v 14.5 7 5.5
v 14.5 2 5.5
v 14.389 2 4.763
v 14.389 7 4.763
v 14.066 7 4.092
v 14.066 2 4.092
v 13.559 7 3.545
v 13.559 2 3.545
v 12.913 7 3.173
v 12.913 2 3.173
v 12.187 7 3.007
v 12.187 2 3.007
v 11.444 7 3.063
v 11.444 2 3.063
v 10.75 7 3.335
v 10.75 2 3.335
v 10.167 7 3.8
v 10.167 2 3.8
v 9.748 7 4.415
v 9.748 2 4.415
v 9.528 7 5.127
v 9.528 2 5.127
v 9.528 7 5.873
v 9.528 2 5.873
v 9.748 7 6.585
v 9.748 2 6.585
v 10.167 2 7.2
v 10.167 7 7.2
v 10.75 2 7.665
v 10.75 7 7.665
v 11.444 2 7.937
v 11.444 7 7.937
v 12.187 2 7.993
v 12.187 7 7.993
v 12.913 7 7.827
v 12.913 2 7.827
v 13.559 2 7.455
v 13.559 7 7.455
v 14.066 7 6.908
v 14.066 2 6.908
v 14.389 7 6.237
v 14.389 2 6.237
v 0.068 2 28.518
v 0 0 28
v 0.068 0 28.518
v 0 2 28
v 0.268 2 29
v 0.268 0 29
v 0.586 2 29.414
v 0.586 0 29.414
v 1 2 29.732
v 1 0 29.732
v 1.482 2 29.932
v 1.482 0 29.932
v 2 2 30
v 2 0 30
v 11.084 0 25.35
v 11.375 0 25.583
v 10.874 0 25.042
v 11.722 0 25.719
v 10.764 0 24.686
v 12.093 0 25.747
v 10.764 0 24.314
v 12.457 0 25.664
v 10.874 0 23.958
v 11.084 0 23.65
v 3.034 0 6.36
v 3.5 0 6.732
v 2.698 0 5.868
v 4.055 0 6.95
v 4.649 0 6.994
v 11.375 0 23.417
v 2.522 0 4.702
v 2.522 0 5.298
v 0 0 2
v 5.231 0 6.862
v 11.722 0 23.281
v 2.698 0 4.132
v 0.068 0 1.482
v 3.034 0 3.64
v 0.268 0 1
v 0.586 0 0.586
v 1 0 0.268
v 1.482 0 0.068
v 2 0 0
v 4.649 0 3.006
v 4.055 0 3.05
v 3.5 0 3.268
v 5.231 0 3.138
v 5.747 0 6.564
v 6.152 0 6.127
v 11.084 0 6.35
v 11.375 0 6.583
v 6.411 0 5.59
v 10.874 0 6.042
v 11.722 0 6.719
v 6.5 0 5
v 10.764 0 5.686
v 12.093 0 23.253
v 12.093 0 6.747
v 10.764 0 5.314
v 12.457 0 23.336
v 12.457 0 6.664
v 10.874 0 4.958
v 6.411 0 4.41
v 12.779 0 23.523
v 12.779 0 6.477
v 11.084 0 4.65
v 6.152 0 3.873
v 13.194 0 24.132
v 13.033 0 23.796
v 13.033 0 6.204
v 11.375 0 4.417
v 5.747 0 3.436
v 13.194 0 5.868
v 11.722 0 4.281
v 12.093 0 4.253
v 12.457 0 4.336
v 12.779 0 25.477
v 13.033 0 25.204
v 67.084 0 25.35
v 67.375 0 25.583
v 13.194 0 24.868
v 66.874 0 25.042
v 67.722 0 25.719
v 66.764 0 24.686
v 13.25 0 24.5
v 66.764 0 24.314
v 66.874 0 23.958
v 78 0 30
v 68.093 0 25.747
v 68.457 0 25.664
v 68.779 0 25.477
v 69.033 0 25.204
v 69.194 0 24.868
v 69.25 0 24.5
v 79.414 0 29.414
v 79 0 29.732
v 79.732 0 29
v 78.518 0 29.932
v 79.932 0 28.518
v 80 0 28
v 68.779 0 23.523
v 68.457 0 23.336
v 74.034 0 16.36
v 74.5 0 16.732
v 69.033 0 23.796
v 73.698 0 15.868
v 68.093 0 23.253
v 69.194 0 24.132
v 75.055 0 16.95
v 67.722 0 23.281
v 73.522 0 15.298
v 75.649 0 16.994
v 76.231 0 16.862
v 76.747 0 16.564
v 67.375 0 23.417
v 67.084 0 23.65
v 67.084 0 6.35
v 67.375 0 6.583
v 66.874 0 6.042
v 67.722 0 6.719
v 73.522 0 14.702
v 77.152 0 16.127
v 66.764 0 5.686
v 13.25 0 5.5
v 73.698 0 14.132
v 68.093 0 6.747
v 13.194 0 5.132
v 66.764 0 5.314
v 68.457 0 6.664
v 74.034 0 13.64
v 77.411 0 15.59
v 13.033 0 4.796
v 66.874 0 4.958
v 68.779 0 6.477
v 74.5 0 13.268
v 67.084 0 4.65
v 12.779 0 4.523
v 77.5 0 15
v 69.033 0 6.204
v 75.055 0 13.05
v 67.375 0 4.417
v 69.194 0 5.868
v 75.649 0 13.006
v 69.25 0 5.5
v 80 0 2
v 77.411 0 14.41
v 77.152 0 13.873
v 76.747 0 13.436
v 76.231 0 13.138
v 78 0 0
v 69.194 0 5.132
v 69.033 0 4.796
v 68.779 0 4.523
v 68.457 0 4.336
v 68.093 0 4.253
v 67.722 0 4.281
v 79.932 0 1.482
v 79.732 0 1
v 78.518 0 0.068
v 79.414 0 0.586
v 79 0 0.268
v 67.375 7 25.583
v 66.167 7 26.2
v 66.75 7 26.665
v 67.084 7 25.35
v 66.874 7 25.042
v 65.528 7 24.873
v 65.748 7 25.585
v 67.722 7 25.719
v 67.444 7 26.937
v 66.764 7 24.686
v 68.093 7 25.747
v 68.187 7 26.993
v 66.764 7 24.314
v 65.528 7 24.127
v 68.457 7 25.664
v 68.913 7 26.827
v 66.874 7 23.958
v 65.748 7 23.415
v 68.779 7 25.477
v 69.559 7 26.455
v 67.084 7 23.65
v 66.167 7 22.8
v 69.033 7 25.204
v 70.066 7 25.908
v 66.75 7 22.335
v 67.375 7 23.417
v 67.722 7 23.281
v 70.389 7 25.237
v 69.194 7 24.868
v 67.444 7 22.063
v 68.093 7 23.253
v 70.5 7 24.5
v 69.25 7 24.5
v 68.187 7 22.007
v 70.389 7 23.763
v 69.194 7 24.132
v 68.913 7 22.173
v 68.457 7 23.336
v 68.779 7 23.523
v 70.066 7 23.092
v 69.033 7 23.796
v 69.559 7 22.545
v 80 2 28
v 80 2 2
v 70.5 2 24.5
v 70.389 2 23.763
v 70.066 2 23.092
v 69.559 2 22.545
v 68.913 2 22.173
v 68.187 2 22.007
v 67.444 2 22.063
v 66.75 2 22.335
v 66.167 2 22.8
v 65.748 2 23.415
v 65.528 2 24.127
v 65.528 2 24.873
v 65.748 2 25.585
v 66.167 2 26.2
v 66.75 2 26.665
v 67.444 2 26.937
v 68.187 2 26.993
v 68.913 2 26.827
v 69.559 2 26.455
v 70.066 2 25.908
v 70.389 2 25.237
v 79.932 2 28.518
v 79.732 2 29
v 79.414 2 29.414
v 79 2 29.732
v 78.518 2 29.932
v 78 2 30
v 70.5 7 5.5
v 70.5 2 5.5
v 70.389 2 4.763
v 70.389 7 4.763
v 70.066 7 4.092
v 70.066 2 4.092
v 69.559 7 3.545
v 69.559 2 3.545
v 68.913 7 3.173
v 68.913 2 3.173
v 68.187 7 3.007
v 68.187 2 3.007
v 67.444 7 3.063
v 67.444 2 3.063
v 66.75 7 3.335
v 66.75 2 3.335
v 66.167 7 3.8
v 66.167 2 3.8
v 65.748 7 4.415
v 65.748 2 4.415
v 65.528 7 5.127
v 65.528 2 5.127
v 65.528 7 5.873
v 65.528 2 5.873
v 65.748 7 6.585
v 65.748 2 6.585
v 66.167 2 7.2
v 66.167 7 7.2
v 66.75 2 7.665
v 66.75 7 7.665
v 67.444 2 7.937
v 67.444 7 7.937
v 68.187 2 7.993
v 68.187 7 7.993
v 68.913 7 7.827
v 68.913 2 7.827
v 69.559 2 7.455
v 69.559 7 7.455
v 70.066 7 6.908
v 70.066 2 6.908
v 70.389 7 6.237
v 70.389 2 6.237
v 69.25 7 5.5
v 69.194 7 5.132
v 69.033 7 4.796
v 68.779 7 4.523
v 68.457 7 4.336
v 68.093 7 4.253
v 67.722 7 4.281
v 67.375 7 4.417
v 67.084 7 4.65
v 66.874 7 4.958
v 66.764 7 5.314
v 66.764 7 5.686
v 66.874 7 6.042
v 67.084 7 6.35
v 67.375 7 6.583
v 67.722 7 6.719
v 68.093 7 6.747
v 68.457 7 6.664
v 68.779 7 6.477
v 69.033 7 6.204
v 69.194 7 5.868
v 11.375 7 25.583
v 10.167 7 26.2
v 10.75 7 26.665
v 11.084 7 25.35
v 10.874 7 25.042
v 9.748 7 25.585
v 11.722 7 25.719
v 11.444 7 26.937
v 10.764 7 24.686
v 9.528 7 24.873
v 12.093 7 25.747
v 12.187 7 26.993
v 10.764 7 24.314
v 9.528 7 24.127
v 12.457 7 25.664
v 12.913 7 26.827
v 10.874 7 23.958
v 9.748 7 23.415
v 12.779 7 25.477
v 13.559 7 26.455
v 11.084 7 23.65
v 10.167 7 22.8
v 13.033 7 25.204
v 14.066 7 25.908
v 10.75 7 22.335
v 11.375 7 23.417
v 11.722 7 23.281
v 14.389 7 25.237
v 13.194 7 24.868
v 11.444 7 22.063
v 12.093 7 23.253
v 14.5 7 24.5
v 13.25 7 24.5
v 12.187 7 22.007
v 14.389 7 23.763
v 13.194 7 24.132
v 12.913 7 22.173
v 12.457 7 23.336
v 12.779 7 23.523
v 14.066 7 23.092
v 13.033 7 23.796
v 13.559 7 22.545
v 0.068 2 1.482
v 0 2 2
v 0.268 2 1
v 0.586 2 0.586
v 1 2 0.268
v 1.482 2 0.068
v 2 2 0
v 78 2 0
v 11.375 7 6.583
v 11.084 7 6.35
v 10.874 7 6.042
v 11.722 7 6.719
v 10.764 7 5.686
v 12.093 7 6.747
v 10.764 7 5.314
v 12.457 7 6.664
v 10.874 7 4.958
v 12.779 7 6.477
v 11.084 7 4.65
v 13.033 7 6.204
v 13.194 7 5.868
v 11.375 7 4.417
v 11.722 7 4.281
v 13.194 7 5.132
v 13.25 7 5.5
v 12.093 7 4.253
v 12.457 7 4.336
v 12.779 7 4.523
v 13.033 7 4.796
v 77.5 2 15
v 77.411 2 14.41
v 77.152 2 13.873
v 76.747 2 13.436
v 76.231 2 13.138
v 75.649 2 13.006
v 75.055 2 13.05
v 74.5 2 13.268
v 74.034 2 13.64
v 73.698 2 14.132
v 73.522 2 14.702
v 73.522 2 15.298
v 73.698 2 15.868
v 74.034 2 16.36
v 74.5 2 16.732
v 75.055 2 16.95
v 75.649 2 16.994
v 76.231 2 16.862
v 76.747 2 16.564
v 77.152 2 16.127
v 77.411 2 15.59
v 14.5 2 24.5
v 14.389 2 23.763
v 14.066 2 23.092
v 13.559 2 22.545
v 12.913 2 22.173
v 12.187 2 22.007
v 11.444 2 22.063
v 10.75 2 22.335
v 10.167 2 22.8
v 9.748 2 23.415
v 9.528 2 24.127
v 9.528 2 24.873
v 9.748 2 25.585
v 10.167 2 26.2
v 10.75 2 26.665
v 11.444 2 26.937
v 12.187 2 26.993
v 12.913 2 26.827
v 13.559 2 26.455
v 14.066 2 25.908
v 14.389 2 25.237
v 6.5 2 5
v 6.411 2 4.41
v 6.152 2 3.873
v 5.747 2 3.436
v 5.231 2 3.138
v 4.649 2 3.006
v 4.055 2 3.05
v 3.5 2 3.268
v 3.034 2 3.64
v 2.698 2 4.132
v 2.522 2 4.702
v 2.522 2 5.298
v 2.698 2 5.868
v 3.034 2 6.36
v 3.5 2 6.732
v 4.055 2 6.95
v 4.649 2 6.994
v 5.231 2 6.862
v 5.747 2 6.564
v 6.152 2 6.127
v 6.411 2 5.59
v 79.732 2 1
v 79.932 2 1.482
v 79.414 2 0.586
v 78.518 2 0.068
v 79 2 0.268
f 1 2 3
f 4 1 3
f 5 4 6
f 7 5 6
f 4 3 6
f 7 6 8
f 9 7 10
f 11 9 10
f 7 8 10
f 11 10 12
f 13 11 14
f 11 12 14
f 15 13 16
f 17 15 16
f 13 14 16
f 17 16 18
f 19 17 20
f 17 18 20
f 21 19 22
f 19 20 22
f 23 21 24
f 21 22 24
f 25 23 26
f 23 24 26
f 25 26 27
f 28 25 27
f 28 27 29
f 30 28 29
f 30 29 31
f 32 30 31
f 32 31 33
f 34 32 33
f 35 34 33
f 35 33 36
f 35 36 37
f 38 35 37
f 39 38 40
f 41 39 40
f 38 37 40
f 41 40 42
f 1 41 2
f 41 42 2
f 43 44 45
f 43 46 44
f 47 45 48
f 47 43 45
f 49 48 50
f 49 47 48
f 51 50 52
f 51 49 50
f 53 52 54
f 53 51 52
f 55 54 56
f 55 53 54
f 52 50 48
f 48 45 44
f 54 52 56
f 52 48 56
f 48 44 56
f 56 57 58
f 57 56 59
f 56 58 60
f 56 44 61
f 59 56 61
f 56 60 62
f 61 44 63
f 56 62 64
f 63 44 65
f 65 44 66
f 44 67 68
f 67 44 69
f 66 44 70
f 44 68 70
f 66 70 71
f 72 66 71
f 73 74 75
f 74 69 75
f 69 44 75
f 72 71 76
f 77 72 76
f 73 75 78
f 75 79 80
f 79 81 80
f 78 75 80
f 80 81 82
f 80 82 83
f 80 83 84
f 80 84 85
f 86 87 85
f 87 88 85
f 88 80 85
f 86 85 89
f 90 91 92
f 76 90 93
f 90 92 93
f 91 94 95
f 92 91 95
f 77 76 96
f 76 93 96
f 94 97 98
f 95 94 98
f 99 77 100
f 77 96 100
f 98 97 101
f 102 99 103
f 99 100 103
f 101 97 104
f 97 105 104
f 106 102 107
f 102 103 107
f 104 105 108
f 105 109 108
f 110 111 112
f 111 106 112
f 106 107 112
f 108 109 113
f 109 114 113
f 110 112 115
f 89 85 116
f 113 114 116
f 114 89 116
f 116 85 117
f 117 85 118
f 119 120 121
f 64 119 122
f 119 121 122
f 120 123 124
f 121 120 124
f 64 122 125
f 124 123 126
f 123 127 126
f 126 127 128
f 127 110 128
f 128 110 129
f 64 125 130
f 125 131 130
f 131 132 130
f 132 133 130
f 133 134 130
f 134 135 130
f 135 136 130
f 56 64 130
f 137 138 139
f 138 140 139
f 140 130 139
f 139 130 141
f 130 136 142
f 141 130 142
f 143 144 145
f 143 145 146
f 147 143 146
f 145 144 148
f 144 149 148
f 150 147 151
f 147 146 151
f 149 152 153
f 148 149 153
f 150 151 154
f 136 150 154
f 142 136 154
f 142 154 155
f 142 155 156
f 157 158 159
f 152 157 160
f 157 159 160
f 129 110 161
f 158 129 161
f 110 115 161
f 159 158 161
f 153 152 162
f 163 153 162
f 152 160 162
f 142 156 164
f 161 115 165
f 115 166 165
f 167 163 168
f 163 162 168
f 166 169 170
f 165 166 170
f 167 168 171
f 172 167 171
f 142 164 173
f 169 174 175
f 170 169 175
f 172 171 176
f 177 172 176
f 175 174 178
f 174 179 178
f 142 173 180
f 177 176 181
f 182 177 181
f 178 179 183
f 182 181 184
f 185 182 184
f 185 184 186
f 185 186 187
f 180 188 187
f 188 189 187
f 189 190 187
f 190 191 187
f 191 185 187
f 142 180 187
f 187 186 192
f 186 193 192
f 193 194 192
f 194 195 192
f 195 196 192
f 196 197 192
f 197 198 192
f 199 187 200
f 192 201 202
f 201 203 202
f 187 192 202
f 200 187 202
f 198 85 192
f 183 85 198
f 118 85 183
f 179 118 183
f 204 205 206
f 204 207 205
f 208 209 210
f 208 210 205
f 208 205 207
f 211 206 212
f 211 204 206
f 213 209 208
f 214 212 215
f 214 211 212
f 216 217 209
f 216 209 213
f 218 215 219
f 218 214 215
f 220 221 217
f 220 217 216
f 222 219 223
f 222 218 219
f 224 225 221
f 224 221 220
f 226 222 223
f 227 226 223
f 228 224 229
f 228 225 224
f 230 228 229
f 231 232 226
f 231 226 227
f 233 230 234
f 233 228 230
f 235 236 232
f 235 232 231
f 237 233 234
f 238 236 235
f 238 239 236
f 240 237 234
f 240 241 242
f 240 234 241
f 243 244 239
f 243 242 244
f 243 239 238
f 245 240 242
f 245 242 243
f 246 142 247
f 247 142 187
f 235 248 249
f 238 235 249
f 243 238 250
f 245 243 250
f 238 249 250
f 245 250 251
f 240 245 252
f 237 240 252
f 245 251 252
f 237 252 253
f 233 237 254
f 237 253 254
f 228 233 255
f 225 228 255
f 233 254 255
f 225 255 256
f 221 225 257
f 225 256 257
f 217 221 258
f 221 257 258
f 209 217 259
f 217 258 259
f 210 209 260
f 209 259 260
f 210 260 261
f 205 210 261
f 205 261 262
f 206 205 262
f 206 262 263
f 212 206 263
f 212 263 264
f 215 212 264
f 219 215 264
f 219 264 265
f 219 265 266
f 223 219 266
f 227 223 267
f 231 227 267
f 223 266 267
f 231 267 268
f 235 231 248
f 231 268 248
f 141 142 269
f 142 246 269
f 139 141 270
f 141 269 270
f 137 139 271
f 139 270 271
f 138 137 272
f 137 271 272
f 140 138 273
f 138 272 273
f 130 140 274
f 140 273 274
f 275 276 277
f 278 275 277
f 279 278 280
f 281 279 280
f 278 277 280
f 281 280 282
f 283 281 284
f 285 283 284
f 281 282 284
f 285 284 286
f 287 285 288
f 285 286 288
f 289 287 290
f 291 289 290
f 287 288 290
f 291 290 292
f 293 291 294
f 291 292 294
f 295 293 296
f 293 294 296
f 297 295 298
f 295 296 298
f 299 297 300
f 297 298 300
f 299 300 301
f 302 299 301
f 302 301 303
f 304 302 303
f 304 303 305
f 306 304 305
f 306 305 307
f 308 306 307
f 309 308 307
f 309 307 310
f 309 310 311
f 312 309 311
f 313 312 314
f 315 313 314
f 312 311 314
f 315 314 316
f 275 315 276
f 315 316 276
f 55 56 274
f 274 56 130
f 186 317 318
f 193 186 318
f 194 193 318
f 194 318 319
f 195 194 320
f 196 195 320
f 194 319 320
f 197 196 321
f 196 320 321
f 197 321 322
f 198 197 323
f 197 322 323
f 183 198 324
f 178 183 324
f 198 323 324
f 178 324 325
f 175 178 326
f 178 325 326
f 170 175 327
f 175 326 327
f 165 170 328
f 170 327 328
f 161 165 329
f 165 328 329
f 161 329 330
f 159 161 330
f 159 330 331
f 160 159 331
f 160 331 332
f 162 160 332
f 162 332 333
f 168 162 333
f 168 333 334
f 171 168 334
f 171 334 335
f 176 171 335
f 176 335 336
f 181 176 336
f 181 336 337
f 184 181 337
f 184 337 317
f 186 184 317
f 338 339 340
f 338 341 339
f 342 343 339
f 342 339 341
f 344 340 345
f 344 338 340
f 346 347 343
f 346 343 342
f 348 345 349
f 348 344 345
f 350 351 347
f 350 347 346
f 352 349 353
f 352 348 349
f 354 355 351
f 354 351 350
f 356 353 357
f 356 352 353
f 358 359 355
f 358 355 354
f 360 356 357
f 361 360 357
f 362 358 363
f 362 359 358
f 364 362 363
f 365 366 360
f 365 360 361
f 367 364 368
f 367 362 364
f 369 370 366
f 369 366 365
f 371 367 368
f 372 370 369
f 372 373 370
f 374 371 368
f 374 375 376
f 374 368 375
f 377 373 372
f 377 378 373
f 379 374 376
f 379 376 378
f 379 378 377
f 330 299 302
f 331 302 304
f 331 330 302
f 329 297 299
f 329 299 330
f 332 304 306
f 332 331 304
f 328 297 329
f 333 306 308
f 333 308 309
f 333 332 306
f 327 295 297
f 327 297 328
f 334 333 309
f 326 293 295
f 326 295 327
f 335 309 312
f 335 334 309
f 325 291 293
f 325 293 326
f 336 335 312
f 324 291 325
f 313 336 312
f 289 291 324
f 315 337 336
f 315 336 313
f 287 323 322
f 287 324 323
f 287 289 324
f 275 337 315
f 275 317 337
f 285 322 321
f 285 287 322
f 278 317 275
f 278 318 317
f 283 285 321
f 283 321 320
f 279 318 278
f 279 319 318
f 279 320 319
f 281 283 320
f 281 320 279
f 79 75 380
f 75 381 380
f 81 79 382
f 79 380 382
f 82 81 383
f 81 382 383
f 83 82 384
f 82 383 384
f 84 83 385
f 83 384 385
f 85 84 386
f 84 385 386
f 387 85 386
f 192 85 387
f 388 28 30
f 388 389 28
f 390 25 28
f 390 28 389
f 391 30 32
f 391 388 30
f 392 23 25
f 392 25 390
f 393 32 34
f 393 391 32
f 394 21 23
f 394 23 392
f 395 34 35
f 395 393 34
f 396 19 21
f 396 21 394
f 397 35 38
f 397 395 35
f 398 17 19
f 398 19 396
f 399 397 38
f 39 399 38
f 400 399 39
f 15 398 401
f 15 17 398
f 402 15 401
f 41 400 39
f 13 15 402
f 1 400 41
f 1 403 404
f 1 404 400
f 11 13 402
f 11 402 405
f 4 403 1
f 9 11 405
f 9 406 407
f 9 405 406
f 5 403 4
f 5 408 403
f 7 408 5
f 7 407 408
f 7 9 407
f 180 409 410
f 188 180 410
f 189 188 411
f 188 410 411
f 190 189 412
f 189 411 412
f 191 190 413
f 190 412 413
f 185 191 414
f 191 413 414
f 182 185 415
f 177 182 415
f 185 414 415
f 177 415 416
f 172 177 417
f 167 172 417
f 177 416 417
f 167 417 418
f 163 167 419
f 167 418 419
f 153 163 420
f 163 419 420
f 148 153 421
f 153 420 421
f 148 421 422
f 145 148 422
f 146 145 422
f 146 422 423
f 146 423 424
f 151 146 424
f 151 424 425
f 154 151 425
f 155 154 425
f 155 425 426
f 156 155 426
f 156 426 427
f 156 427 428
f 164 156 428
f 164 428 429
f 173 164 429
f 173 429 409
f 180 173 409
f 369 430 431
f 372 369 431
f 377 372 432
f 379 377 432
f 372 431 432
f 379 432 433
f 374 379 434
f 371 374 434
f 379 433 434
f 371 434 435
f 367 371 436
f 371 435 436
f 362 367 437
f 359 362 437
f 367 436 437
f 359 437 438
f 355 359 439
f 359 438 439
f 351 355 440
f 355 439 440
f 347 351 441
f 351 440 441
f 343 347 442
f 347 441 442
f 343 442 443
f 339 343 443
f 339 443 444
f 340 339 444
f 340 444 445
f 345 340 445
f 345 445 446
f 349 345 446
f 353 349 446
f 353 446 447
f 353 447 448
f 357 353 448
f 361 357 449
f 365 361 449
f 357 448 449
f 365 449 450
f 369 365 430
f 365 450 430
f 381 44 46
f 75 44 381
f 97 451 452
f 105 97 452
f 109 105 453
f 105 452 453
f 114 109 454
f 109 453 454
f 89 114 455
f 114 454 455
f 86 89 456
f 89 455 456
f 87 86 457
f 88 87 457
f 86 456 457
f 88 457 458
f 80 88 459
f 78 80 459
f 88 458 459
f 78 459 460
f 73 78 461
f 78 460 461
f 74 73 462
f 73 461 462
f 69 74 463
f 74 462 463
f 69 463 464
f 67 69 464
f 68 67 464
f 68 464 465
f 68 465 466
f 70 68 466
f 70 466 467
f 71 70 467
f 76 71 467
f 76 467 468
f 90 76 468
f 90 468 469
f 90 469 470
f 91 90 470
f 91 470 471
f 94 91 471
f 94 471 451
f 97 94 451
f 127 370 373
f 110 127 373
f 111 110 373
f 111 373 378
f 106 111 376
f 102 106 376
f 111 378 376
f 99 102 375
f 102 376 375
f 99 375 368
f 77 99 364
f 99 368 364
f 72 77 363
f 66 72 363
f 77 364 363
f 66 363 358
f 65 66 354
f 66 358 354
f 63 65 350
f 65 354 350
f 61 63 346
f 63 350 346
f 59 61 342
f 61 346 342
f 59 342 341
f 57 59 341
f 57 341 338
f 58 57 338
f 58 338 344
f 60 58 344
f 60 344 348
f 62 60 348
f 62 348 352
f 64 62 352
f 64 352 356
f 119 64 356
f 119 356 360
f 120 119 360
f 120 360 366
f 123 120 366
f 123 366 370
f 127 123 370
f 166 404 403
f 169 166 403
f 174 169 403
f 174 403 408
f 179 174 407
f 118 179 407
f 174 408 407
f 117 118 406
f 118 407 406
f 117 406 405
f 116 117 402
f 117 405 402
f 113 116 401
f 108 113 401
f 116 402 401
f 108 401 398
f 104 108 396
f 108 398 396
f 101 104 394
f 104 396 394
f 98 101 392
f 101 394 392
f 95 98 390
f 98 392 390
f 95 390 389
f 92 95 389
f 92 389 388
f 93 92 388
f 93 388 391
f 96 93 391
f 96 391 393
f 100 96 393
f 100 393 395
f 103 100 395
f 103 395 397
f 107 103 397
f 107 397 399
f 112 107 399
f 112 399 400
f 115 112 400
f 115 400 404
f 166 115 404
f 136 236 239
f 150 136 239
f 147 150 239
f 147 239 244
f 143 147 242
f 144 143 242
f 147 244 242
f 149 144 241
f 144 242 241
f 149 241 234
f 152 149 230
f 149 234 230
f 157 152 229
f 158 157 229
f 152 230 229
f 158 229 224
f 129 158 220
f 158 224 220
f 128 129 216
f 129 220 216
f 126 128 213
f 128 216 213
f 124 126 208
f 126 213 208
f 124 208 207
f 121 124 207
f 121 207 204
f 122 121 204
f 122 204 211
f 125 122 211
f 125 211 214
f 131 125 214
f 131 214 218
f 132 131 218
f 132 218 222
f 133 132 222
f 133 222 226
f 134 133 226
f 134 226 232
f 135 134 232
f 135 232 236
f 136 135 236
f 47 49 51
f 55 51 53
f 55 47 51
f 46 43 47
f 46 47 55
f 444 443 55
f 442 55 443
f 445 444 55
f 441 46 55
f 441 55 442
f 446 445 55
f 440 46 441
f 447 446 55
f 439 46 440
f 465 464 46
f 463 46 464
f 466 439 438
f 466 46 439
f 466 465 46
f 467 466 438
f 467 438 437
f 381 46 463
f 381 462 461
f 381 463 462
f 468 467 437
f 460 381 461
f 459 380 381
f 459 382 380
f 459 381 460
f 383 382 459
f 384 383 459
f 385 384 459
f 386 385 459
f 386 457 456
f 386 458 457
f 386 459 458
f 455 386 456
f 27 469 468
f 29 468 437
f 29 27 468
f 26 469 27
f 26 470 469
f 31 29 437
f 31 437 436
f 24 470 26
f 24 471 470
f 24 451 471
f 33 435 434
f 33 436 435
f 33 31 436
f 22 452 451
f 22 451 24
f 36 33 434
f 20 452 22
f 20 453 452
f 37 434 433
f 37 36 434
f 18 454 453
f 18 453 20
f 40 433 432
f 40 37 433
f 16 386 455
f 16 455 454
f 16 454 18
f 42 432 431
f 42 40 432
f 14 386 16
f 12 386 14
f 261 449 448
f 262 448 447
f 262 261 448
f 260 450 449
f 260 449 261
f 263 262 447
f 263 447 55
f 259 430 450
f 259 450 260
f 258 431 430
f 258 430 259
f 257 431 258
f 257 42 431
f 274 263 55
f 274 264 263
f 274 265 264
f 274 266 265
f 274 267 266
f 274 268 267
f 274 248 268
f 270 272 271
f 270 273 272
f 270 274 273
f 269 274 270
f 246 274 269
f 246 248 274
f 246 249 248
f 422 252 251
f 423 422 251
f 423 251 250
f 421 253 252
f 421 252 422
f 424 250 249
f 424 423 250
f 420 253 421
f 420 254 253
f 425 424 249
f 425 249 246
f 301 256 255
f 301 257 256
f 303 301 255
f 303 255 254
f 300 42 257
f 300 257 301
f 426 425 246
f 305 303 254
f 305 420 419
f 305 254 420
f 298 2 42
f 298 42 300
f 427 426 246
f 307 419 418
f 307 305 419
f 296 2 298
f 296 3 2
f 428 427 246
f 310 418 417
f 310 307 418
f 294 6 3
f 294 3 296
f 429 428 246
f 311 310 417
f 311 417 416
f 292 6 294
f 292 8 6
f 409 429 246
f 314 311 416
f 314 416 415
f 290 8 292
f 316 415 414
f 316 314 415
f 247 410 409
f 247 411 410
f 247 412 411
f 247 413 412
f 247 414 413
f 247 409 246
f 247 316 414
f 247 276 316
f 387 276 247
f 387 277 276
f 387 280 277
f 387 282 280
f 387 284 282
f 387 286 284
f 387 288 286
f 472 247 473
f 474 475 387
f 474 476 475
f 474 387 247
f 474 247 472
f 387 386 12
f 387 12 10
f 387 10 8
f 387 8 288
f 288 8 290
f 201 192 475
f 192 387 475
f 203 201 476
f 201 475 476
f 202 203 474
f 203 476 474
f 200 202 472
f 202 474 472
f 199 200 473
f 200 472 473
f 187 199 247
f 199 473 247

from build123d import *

# Parameters (mm, degrees)
SKETCH_1_W               = 80
SKETCH_1_H               = 30
EXTRUDE_1_DEPTH          = 2
SKETCH_2_R               = 2.5
EXTRUDE_2_DEPTH          = 5
SKETCH_3_R               = 1.25
CUT_EXTRUDE_1_DEPTH      = 1
CUT_EXTRUDE_1_DEPTH_BACK = 8
SKETCH_4_R               = 2
CUT_EXTRUDE_2_DEPTH      = 6
CUT_EXTRUDE_2_DEPTH_BACK = 3
FILLET_1_R               = 2
FILLET_2_R               = 2
FILLET_3_R               = 2
FILLET_4_R               = 2


with BuildPart() as part:
    # Эскиз1 → Бобышка-Вытянуть1 (new body)
    with BuildSketch(Plane(origin=(0, 0, 0), x_dir=(1, 0, 0), z_dir=(0, 1, 0))):
        with Locations((40, -15)):
            Rectangle(SKETCH_1_W, SKETCH_1_H)
    extrude(amount=EXTRUDE_1_DEPTH)

    # Эскиз2 → Бобышка-Вытянуть2 (add)
    with BuildSketch(Plane(origin=(0, 2, 0), x_dir=(1, 0, 0), z_dir=(0, 1, 0))):
        with Locations((12, -5.5)):
            Circle(SKETCH_2_R)
        with Locations((12, -24.5)):
            Circle(SKETCH_2_R)
        with Locations((68, -5.5)):
            Circle(SKETCH_2_R)
        with Locations((68, -24.5)):
            Circle(SKETCH_2_R)
    extrude(amount=EXTRUDE_2_DEPTH)

    # Эскиз3 → Вырез-Вытянуть1 (cut, two sides)
    with BuildSketch(Plane(origin=(0, 7, 0), x_dir=(1, 0, 0), z_dir=(0, 1, 0))) as cut_extrude_1_sk:
        with Locations((12, -5.5)):
            Circle(SKETCH_3_R)
        with Locations((12, -24.5)):
            Circle(SKETCH_3_R)
        with Locations((68, -5.5)):
            Circle(SKETCH_3_R)
        with Locations((68, -24.5)):
            Circle(SKETCH_3_R)
    extrude(amount=CUT_EXTRUDE_1_DEPTH, mode=Mode.SUBTRACT)
    extrude(cut_extrude_1_sk.sketch, amount=-CUT_EXTRUDE_1_DEPTH_BACK, mode=Mode.SUBTRACT)

    # Эскиз4 → Вырез-Вытянуть2 (cut, two sides)
    with BuildSketch(Plane(origin=(0, 2, 0), x_dir=(1, 0, 0), z_dir=(0, 1, 0))) as cut_extrude_2_sk:
        with Locations((4.5, -5)):
            Circle(SKETCH_4_R)
        with Locations((75.5, -15)):
            Circle(SKETCH_4_R)
    extrude(amount=CUT_EXTRUDE_2_DEPTH, mode=Mode.SUBTRACT)
    extrude(cut_extrude_2_sk.sketch, amount=-CUT_EXTRUDE_2_DEPTH_BACK, mode=Mode.SUBTRACT)

    # Скругление1
    fillet_1_edges = [part.edges().sort_by_distance(p)[0] for p in [
        (0, 1, 30),
    ]]
    fillet(fillet_1_edges, radius=FILLET_1_R)

    # Скругление2
    fillet_2_edges = [part.edges().sort_by_distance(p)[0] for p in [
        (0, 1, 0),
    ]]
    fillet(fillet_2_edges, radius=FILLET_2_R)

    # Скругление3
    fillet_3_edges = [part.edges().sort_by_distance(p)[0] for p in [
        (80, 1, 0),
    ]]
    fillet(fillet_3_edges, radius=FILLET_3_R)

    # Скругление4
    fillet_4_edges = [part.edges().sort_by_distance(p)[0] for p in [
        (80, 1, 30),
    ]]
    fillet(fillet_4_edges, radius=FILLET_4_R)


solid = part.part
